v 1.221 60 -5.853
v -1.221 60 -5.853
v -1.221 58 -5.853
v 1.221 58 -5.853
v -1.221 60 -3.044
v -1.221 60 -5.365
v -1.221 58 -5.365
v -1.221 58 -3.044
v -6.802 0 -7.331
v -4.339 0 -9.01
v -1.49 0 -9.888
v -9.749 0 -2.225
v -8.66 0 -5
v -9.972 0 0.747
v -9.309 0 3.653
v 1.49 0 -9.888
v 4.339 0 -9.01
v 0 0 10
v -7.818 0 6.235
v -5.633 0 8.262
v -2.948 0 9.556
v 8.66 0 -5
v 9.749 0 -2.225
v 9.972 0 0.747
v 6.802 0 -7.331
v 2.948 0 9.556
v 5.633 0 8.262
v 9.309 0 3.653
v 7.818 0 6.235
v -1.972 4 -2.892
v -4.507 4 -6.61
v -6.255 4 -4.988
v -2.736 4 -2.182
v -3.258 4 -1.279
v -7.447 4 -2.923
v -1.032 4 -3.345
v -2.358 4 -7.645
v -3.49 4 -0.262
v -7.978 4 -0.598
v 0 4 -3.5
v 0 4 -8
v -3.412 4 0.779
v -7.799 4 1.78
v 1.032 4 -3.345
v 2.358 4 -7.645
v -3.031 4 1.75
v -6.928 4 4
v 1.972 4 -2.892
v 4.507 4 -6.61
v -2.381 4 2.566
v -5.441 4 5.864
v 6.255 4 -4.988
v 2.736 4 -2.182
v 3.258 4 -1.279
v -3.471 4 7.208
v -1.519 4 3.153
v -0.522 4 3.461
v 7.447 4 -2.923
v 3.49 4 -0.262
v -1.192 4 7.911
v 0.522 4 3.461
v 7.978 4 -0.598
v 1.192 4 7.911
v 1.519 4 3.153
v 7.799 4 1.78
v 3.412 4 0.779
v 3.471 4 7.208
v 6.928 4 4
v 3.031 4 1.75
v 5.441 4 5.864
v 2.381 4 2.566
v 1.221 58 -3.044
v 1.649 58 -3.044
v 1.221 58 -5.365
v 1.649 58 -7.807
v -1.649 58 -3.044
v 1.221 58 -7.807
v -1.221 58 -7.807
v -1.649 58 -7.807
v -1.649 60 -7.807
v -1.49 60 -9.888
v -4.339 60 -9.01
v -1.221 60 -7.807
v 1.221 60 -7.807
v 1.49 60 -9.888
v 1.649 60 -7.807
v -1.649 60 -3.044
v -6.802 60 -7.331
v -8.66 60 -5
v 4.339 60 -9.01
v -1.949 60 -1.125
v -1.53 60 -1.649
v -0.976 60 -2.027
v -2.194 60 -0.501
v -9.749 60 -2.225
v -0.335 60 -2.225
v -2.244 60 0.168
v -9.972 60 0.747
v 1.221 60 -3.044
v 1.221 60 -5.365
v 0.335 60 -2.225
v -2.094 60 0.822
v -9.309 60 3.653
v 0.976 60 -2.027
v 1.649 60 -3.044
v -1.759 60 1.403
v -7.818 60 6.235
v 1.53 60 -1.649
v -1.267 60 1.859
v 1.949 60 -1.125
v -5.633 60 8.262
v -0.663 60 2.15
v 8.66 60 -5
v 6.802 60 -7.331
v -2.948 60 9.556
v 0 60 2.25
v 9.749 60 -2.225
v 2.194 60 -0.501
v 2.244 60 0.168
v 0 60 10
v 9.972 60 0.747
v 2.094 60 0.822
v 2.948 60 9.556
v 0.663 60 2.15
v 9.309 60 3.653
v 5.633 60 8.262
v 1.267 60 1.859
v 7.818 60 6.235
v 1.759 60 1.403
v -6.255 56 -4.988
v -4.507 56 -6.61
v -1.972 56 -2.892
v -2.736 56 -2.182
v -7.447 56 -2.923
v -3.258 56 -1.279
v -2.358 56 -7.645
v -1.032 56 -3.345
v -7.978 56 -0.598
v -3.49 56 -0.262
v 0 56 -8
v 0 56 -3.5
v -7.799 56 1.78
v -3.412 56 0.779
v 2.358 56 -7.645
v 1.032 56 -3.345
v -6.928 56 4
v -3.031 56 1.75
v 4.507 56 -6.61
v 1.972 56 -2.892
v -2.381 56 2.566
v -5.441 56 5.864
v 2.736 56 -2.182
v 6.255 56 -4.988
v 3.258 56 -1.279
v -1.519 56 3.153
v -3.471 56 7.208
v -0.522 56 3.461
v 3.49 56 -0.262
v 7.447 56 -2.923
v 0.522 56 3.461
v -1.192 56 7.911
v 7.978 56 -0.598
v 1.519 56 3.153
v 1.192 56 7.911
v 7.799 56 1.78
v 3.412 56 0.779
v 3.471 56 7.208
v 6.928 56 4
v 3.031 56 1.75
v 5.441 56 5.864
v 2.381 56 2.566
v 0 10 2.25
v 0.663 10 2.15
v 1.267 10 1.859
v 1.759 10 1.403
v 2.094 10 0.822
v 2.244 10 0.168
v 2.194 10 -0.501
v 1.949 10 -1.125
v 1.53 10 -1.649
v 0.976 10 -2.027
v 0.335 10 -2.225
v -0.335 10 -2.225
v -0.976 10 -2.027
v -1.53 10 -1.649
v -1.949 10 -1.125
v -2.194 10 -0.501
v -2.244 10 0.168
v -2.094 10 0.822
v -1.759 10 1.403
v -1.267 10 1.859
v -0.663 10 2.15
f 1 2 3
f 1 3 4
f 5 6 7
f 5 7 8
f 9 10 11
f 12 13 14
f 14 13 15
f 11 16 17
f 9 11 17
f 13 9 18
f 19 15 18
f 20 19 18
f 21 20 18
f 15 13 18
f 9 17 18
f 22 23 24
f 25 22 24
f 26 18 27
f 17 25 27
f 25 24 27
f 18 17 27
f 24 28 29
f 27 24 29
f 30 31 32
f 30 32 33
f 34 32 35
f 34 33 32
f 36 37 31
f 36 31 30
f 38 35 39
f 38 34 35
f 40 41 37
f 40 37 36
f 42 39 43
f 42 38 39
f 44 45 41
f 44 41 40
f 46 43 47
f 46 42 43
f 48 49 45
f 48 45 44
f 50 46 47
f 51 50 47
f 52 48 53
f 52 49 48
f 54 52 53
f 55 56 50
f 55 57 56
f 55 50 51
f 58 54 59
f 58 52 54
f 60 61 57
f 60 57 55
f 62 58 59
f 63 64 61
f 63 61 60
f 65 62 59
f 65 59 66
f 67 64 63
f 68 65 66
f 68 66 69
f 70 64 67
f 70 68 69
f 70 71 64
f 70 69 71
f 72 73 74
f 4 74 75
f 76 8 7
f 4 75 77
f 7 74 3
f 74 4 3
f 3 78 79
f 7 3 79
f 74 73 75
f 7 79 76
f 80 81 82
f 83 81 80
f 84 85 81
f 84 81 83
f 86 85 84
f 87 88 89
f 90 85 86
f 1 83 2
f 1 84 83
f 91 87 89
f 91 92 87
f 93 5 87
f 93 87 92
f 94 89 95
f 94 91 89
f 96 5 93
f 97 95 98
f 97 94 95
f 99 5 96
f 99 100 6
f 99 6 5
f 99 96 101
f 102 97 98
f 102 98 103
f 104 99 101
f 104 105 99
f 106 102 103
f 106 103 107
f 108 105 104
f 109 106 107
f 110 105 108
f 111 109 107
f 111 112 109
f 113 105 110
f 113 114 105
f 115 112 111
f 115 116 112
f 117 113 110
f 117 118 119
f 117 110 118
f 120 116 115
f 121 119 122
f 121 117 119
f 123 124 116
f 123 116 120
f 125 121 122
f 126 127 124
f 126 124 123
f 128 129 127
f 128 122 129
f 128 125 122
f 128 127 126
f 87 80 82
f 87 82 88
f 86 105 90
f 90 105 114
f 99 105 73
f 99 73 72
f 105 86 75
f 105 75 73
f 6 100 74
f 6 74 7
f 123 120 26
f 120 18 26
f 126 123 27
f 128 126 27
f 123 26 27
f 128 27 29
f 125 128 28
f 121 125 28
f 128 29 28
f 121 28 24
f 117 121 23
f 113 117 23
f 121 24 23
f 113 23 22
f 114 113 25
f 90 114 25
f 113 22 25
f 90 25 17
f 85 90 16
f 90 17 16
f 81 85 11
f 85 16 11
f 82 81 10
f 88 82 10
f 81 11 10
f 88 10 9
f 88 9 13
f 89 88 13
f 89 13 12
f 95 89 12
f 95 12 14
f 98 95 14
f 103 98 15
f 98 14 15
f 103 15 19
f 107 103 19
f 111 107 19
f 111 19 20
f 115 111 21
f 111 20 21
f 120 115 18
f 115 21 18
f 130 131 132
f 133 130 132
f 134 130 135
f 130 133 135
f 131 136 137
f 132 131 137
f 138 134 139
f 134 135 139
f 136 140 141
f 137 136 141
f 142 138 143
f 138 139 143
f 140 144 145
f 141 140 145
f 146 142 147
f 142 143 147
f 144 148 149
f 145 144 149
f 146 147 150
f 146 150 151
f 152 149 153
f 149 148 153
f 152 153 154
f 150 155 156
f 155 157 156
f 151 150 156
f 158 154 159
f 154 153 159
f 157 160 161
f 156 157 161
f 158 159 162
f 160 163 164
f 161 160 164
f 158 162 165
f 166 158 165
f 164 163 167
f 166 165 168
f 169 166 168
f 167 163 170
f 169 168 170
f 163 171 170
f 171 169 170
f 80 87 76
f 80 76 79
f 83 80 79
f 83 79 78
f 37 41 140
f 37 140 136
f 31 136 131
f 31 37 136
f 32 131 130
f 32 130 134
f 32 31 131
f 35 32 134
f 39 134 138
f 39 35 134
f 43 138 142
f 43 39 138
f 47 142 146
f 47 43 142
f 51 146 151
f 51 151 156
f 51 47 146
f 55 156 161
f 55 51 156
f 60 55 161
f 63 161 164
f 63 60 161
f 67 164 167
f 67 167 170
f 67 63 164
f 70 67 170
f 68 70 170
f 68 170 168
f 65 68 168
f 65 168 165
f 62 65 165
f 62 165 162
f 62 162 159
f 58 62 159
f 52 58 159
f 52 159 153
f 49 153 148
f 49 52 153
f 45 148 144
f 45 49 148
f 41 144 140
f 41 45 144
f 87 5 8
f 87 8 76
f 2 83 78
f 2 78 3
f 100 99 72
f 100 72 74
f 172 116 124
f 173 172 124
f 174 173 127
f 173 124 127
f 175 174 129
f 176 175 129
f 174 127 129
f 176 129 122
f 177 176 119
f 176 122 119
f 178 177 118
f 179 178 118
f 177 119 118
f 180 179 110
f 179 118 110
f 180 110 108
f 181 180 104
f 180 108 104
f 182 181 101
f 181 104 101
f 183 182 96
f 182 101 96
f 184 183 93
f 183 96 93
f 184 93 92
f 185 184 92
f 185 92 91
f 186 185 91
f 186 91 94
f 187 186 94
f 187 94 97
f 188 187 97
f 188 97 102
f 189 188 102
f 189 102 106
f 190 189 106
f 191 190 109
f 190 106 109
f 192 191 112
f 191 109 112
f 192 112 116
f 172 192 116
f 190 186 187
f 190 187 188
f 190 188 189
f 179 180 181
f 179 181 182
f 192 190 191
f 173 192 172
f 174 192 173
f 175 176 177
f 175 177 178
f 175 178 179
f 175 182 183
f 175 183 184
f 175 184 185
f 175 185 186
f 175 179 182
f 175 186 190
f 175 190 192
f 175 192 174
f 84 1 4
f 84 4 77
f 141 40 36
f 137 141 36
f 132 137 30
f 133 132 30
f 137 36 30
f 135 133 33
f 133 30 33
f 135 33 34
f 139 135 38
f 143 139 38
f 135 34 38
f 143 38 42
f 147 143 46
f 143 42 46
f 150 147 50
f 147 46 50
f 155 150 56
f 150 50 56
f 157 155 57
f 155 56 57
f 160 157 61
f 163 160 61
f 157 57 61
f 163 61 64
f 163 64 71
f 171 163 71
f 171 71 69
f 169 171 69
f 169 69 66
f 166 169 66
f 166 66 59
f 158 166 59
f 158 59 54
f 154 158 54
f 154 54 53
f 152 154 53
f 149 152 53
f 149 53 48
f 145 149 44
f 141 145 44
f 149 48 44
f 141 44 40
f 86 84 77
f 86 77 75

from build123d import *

# Parameters (mm, degrees)
SKETCH1_R           = 10
BOSS_EXTRUDE1_DEPTH = 4
SKETCH2_R           = 10
SKETCH2_R_2         = 8
SKETCH2_R_3         = 3.5
BOSS_EXTRUDE2_DEPTH = 52
SKETCH3_R           = 10
BOSS_EXTRUDE3_DEPTH = 4
CUT_EXTRUDE1_DEPTH  = 2
SKETCH5_R           = 2.25
CUT_EXTRUDE2_DEPTH  = 50


with BuildPart() as part:
    # Sketch1 → Boss-Extrude1 (new body)
    with BuildSketch(Plane(origin=(0, 0, 0), x_dir=(1, 0, 0), z_dir=(0, 1, 0))):
        with Locations(Location((0, 0, 0), (0, 0, 270))):
            Circle(SKETCH1_R)
    extrude(amount=BOSS_EXTRUDE1_DEPTH)

    # Sketch2 → Boss-Extrude2 (add)
    # profile 1 of 2: a face of its own
    with BuildSketch(Plane(origin=(0, 4, 0), x_dir=(1, 0, 0), z_dir=(0, 1, 0))):
        with Locations(Location((0, 0, 0), (0, 0, 270))):
            Circle(SKETCH2_R)
        with Locations(Location((0, 0, 0), (0, 0, 90))):
            Circle(SKETCH2_R_2, mode=Mode.SUBTRACT)
    # profile 2 of 2: a face of its own
    with BuildSketch(Plane(origin=(0, 4, 0), x_dir=(1, 0, 0), z_dir=(0, 1, 0))):
        with Locations(Location((0, 0, 0), (0, 0, 90))):
            Circle(SKETCH2_R_3)
    extrude(amount=BOSS_EXTRUDE2_DEPTH)

    # Sketch3 → Boss-Extrude3 (add)
    with BuildSketch(Plane(origin=(0, 56, 0), x_dir=(1, 0, 0), z_dir=(0, 1, 0))):
        with Locations(Location((0, 0, 0), (0, 0, 270))):
            Circle(SKETCH3_R)
    extrude(amount=BOSS_EXTRUDE3_DEPTH)

    # Sketch4 → Cut-Extrude1 (cut)
    with BuildSketch(Plane(origin=(0, 60, 0), x_dir=(1, 0, 0), z_dir=(0, 1, 0))):
        Polygon((-1.648557692, 7.80697224), (-1.221153846, 7.80697224), (-1.221153846, 5.853126086), (1.221153846, 5.853126086), (1.221153846, 7.80697224), (1.648557692, 7.80697224), (1.648557692, 3.04447224), (1.221153846, 3.04447224), (1.221153846, 5.364664548), (-1.221153846, 5.364664548), (-1.221153846, 3.04447224), (-1.648557692, 3.04447224), align=None)
    extrude(amount=-CUT_EXTRUDE1_DEPTH, mode=Mode.SUBTRACT)

    # Sketch5 → Cut-Extrude2 (cut)
    with BuildSketch(Plane(origin=(0, 60, 0), x_dir=(1, 0, 0), z_dir=(0, 1, 0))):
        with Locations(Location((0, 0, 0), (0, 0, 270))):
            Circle(SKETCH5_R)
    extrude(amount=-CUT_EXTRUDE2_DEPTH, mode=Mode.SUBTRACT)


solid = part.part
